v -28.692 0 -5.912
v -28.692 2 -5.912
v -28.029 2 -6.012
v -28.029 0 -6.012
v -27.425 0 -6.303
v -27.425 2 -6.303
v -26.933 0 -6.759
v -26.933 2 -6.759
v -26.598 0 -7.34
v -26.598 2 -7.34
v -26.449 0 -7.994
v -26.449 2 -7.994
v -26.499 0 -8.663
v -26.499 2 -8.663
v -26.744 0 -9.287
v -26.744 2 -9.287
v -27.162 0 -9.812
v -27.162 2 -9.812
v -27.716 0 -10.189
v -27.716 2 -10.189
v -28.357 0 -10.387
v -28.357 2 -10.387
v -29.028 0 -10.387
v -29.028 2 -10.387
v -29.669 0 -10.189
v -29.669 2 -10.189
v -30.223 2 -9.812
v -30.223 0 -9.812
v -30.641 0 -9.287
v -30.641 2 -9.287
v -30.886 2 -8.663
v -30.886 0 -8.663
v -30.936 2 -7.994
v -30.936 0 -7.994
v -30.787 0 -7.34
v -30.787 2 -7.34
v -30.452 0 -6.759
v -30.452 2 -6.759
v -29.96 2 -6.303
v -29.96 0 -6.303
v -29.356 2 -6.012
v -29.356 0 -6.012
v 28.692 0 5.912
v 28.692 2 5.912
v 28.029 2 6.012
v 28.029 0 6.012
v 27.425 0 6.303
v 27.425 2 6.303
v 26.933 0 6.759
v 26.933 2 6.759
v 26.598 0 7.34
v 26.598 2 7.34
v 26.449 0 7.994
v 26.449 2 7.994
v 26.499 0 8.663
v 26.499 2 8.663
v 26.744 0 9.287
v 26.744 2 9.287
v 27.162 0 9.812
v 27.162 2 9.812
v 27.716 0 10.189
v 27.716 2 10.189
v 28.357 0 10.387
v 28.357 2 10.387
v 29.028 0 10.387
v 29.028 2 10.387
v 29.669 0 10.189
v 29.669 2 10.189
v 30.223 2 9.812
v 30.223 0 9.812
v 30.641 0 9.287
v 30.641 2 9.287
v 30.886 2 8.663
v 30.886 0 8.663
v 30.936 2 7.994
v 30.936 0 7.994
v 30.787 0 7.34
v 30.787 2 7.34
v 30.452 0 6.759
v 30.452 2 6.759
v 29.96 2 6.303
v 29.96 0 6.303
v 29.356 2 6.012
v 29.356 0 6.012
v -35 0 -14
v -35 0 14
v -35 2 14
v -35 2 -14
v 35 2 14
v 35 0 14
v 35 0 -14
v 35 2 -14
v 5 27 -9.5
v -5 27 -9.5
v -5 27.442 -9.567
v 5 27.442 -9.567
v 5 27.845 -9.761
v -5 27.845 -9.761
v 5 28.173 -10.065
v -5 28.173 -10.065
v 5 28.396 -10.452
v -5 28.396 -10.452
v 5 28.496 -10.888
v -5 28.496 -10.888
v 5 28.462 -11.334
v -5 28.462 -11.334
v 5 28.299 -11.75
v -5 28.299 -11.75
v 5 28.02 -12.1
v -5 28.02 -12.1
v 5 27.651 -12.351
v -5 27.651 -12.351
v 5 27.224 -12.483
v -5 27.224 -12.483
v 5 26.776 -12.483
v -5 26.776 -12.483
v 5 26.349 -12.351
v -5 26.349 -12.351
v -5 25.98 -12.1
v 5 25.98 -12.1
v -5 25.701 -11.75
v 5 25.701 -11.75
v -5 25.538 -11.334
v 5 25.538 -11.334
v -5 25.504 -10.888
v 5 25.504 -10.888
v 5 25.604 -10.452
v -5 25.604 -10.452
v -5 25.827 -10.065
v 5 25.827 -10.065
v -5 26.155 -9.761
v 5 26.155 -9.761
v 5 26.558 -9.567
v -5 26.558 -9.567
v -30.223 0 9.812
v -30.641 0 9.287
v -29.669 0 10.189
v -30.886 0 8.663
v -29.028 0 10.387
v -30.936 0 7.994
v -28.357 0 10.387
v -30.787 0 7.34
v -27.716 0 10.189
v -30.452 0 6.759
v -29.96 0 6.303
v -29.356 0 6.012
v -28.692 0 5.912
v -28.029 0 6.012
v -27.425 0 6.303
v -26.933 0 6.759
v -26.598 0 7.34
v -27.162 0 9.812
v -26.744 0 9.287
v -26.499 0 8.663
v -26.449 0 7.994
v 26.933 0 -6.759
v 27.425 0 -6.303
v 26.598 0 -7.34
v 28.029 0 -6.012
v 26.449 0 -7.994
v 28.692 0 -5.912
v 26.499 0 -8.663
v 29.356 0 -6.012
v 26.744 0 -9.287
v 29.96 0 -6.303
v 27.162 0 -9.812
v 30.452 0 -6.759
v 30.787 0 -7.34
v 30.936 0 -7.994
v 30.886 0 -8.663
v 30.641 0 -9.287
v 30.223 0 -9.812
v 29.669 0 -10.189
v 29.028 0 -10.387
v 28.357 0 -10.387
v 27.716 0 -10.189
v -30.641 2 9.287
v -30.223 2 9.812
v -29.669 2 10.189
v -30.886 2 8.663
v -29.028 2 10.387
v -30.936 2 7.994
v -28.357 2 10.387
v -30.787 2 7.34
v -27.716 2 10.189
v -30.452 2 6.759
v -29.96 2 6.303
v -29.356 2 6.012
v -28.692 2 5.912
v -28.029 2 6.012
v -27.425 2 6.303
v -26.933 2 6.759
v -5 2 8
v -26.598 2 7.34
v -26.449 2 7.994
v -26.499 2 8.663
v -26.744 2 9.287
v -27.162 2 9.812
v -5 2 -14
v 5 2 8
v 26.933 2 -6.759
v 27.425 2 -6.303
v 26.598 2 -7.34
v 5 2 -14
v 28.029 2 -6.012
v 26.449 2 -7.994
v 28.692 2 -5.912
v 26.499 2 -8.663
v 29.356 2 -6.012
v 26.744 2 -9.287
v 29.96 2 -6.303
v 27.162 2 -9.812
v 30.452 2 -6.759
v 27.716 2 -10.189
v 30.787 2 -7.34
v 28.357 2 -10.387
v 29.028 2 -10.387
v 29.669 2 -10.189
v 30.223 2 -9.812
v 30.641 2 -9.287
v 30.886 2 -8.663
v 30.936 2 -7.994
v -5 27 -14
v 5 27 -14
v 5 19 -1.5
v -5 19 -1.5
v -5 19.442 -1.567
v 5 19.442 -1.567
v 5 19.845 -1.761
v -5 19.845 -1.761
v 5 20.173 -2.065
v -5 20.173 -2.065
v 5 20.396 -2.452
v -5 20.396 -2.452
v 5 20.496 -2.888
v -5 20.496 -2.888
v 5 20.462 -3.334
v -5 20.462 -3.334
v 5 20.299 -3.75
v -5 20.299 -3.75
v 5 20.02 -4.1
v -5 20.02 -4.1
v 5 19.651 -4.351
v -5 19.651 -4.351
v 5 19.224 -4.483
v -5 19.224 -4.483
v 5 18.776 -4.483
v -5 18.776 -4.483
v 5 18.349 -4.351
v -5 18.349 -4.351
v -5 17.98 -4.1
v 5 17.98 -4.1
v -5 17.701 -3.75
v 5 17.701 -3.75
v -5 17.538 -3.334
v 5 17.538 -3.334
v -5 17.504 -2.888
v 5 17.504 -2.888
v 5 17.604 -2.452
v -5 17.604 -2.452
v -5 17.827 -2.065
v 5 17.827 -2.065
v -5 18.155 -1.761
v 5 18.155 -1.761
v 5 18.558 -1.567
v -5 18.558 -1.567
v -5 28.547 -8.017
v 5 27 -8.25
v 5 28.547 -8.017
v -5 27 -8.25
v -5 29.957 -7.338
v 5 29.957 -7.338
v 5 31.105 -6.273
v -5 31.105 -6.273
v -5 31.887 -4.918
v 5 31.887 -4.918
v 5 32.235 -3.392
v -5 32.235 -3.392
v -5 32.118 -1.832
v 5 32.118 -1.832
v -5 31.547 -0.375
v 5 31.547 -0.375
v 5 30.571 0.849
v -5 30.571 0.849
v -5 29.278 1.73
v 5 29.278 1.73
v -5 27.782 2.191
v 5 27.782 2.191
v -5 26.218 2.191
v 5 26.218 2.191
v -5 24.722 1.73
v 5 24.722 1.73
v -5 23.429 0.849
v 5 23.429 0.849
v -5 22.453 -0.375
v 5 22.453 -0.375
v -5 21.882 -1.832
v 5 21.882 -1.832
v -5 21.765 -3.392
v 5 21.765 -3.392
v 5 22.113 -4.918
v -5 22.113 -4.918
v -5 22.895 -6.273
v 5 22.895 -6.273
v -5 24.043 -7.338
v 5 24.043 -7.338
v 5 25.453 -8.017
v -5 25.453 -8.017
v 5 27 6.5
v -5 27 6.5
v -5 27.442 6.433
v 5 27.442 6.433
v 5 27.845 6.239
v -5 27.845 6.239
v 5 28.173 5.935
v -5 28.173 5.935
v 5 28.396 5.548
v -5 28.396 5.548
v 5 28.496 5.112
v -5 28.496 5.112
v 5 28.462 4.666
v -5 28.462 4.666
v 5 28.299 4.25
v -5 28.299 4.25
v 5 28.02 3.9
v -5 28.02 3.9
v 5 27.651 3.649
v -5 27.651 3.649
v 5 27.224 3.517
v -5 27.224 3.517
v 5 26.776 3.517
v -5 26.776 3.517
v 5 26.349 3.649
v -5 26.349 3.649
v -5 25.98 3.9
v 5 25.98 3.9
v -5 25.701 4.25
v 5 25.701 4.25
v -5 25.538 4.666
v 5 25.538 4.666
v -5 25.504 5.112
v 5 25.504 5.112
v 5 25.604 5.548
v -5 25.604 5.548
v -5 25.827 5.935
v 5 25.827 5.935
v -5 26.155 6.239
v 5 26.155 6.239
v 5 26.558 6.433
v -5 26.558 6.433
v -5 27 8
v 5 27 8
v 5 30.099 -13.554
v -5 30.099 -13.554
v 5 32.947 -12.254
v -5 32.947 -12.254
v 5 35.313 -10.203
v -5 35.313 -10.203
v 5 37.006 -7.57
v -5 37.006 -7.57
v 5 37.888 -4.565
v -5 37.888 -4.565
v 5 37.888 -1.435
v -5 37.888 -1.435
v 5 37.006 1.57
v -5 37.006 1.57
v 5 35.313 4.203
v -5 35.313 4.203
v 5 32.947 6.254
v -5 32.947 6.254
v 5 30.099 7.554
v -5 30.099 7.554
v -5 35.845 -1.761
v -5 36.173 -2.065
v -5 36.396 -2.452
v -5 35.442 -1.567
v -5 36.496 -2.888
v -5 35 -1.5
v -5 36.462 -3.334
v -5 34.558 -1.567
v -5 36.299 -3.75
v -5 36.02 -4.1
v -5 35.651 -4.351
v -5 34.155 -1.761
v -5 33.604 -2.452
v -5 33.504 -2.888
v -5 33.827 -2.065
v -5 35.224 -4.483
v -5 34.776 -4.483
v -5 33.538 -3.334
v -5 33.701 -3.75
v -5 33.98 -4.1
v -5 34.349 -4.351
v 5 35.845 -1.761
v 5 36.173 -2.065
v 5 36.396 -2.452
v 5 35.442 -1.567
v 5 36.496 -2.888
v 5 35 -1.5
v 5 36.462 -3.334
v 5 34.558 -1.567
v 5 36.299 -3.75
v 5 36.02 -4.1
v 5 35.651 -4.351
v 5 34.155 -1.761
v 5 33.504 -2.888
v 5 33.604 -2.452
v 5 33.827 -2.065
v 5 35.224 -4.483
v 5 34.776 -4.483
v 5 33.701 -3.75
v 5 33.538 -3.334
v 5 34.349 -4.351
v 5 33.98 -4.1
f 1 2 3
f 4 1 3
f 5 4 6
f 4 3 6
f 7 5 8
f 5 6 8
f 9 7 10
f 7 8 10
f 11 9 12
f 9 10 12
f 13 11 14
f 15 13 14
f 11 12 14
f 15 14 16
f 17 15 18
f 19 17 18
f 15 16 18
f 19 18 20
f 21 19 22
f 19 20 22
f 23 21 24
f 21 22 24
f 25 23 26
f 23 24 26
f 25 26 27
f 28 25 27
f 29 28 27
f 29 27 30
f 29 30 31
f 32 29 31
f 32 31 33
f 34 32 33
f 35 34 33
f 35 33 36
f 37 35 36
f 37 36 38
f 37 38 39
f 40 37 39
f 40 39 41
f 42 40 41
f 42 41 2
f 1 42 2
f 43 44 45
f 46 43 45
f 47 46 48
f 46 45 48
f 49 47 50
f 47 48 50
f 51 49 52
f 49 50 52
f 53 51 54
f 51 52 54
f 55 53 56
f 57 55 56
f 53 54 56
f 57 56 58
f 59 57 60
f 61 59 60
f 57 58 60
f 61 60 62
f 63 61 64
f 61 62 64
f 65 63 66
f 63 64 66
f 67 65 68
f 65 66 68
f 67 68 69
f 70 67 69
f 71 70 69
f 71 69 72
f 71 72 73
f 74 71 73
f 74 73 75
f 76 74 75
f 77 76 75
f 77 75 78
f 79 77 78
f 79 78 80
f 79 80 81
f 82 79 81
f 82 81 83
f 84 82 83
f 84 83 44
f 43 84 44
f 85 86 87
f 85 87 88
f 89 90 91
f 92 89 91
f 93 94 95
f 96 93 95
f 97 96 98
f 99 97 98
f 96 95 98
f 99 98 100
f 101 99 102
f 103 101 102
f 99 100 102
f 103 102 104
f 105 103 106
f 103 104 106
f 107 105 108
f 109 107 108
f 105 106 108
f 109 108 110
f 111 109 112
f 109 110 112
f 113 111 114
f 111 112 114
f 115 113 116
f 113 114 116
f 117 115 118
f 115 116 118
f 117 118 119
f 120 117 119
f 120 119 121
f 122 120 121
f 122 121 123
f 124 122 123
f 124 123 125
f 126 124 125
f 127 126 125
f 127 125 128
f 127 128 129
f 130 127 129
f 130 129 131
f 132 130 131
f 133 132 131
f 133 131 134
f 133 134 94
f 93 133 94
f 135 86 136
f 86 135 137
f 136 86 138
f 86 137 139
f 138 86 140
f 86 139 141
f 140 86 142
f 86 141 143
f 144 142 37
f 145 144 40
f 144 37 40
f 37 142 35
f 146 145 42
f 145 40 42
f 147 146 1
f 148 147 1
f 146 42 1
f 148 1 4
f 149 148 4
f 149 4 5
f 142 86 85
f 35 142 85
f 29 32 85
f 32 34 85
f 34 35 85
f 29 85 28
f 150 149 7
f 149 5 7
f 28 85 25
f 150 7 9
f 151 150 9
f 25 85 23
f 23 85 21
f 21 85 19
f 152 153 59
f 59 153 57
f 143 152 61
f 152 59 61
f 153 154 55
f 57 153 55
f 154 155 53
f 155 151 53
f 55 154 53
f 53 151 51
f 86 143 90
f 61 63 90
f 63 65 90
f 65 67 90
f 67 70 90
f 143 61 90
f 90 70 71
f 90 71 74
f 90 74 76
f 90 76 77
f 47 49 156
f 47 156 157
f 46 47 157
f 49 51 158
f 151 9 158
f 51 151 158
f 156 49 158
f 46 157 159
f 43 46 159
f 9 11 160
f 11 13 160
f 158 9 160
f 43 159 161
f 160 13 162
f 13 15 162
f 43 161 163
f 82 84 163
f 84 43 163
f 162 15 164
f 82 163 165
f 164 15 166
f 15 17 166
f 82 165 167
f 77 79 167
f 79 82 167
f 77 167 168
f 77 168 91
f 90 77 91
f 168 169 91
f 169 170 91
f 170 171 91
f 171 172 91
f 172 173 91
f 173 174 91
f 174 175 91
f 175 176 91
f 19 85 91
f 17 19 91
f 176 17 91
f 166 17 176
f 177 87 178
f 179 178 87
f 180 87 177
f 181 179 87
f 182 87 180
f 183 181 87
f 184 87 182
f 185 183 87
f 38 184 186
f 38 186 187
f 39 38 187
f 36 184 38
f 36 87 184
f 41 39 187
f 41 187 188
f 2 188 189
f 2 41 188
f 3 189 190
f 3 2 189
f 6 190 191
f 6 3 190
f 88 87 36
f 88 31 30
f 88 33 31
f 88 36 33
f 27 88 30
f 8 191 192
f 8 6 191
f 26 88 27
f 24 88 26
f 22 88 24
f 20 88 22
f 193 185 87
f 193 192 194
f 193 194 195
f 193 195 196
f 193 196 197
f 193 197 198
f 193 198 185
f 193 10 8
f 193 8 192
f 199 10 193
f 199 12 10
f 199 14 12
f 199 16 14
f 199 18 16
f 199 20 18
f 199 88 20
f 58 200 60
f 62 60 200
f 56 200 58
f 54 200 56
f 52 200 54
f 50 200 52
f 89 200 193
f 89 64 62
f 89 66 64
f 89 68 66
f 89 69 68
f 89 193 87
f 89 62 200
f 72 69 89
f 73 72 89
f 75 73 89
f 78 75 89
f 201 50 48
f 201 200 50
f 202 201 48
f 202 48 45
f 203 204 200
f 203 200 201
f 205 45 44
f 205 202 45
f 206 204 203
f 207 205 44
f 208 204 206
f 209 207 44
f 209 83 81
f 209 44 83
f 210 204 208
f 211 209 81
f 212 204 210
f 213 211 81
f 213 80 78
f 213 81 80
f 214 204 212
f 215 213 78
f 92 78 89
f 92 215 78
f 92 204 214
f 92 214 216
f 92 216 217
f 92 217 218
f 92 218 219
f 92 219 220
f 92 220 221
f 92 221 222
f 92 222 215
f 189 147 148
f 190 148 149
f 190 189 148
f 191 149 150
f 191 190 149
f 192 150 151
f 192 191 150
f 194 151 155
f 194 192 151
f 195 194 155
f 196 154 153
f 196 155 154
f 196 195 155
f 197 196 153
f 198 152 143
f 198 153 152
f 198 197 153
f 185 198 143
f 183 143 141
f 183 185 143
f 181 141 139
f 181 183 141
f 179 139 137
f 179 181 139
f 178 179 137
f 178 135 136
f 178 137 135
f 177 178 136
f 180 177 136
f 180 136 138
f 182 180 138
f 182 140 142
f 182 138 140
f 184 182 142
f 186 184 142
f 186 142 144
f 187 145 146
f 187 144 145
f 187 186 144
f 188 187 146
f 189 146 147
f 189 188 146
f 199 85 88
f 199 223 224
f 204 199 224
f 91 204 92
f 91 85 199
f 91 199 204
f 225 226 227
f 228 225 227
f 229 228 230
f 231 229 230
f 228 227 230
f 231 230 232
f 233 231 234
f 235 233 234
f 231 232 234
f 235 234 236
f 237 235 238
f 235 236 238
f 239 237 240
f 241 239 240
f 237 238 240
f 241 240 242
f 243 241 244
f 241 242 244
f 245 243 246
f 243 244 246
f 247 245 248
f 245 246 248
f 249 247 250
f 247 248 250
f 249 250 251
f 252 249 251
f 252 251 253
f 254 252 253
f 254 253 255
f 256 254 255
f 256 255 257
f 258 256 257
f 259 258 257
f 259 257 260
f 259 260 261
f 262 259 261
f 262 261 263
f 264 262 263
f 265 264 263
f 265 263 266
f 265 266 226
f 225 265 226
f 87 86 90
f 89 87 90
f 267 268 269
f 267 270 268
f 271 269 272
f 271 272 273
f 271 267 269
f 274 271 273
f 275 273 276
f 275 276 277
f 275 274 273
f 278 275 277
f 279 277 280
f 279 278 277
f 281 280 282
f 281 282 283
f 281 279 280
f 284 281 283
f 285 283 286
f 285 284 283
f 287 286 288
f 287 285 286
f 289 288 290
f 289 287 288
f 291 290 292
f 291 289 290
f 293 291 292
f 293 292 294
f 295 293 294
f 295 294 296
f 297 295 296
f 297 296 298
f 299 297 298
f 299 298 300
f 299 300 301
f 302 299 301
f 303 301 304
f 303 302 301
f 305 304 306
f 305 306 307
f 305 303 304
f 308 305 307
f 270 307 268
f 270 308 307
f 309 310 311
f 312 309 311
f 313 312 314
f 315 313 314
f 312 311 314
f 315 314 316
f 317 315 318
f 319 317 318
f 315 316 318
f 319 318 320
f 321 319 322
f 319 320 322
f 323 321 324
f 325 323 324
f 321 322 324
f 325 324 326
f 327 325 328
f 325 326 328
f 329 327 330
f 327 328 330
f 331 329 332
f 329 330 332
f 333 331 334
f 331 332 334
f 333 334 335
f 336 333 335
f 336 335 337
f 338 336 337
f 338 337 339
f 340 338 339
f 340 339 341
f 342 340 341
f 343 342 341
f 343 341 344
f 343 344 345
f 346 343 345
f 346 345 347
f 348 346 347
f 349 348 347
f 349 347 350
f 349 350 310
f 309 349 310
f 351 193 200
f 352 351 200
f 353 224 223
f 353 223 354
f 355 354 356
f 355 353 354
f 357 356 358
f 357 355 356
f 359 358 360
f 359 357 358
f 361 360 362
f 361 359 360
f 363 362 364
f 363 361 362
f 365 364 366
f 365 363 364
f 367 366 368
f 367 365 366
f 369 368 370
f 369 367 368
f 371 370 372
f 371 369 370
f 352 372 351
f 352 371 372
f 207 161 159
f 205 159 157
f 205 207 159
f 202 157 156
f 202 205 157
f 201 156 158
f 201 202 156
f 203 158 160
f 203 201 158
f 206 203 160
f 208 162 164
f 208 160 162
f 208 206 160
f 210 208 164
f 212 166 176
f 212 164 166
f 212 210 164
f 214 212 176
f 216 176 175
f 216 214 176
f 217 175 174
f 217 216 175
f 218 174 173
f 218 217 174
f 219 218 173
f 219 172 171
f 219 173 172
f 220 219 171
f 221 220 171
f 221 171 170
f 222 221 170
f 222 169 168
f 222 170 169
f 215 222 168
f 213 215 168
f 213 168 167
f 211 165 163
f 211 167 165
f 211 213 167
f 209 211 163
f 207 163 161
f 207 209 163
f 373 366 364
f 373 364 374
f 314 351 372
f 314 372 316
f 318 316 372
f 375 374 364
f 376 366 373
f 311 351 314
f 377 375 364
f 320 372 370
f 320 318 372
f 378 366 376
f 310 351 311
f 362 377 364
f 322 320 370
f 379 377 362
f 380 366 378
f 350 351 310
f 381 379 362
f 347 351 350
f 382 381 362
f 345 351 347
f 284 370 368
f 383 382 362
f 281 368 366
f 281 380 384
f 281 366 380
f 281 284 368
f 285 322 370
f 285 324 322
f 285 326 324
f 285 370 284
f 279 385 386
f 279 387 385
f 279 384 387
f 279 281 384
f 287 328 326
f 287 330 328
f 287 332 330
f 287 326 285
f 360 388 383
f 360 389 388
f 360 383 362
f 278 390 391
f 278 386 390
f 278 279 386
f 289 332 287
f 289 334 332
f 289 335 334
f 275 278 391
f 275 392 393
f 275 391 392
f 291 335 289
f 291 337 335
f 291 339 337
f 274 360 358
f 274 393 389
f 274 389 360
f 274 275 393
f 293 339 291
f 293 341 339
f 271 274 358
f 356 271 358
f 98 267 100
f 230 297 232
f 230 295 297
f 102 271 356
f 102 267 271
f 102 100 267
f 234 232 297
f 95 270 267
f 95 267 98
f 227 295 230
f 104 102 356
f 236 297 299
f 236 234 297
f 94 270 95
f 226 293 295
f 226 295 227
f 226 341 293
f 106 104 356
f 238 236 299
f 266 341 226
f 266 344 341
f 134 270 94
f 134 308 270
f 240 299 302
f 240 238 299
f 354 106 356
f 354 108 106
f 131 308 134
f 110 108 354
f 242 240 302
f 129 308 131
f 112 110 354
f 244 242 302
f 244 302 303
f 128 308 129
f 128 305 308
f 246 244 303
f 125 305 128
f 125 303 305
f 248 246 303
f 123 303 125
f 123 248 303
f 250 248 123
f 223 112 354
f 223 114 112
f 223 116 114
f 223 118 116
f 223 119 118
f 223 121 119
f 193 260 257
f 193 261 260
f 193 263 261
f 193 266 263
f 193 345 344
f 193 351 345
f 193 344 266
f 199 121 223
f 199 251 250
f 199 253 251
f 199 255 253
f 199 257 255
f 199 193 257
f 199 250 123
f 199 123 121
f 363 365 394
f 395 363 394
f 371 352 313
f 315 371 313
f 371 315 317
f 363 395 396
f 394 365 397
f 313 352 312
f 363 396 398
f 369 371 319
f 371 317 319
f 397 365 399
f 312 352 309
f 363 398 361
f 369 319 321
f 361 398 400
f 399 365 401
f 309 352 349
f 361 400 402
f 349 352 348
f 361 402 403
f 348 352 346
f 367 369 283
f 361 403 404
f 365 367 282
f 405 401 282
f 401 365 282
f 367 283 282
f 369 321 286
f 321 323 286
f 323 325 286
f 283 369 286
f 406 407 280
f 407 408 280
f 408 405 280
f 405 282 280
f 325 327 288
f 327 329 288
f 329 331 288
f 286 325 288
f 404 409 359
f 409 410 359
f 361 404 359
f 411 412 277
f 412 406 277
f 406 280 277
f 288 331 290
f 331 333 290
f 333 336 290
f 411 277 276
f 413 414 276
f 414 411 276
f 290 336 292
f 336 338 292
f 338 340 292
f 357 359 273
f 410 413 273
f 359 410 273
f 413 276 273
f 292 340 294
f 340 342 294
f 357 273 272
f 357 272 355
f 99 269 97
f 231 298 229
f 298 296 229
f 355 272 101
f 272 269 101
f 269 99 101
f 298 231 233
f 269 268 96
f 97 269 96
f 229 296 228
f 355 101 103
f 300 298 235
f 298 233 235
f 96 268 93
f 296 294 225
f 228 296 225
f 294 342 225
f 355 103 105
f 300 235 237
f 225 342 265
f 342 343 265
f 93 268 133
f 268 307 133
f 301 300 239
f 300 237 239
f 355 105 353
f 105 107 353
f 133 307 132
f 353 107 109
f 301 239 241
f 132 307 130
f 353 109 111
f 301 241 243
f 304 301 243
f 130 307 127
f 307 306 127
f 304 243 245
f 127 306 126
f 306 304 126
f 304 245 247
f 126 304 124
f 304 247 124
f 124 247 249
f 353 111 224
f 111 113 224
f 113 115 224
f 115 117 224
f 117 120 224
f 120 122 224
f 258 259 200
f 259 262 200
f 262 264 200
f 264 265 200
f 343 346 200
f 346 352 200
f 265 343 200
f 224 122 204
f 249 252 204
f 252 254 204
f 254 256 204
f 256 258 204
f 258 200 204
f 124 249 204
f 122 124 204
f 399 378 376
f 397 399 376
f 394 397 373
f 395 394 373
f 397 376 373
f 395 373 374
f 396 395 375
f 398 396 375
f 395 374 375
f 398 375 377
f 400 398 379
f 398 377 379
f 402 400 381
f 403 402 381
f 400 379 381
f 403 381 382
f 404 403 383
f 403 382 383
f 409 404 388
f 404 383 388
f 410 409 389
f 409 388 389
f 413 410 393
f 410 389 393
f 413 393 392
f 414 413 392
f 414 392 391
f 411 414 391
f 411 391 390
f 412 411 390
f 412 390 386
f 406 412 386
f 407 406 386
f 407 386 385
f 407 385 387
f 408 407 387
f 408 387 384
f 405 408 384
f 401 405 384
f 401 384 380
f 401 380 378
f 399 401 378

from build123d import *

# Parameters (mm, degrees)
SKETCH1_W                = 70
SKETCH1_H                = 28
BOSS_EXTRUDE1_DEPTH      = 2
SKETCH2_R                = 11
SKETCH2_R_2              = 5.25
BOSS_EXTRUDE2_DEPTH      = 5
BOSS_EXTRUDE3_REACH      = 54.125
BOSS_EXTRUDE3_END_RADIUS = 11
SKETCH3_W                = 10
SKETCH3_H                = 22
SKETCH5_R                = 2.25
CUT_EXTRUDE1_DEPTH       = 53.12485012
MIRROR2_COPY_1_SKETCH_R  = 2.25
MIRROR2_COPY_1_DEPTH     = 53.12485012
SKETCH6_R                = 1.5
CUT_EXTRUDE2_DEPTH       = 57.920997883


with BuildPart() as part:
    # Sketch1 → Boss-Extrude1 (new body)
    with BuildSketch(Plane(origin=(0, 0, 0), x_dir=(1, 0, 0), z_dir=(0, 1, 0))):
        Rectangle(SKETCH1_W, SKETCH1_H)
    extrude(amount=BOSS_EXTRUDE1_DEPTH)



with BuildPart() as body_2:
    # Sketch2 → Boss-Extrude2 (new, symmetric)
    with BuildSketch(Plane(origin=(0, 0, 0), x_dir=(0, 0, -1), z_dir=(1, 0, 0))):
        with Locations((3, 27)):
            Circle(SKETCH2_R)
        with Locations((3, 27)):
            Circle(SKETCH2_R_2, mode=Mode.SUBTRACT)
    extrude(amount=BOSS_EXTRUDE2_DEPTH, both=True)


with BuildPart() as part_1:
    add(part.part)

    add(body_2.part)  # Boss-Extrude3 merges body 2
    # Boss-Extrude3: up to this cylinder (the profile starts outside it)
    boss_extrude3_end = Plane(origin=(0, 27, -3), z_dir=(-1, 0, 0)) * Cylinder(BOSS_EXTRUDE3_END_RADIUS, 131.25, mode=Mode.PRIVATE)
    # Sketch3 → Boss-Extrude3 (add, up to the surface)
    with BuildSketch(Plane(origin=(0, 2, 0), x_dir=(1, 0, 0), z_dir=(0, 1, 0)), mode=Mode.PRIVATE) as boss_extrude3_sk1:
        with Locations((0, 3)):
            Rectangle(SKETCH3_W, SKETCH3_H)
    boss_extrude3_tool1 = extrude(boss_extrude3_sk1.sketch, amount=BOSS_EXTRUDE3_REACH, mode=Mode.PRIVATE) - boss_extrude3_end
    add(boss_extrude3_tool1.solids().sort_by_distance((0, 2, -3))[0])

    # Sketch5 → Cut-Extrude1 (cut, through all)
    with BuildSketch(Plane(origin=(0, 2, 0), x_dir=(1, 0, 0), z_dir=(0, 1, 0))):
        with Locations(Location((-28.692400687, 8.162233715, 0), (0, 0, 270))):
            Circle(SKETCH5_R)
    cut_extrude1 = extrude(amount=-CUT_EXTRUDE1_DEPTH, mode=Mode.SUBTRACT)

    # Mirror1: Cut-Extrude1 across plane
    add(cut_extrude1.mirror(Plane(origin=(0, 0, 0), x_dir=(1, 0, 0), z_dir=(0, 0, -1))), mode=Mode.SUBTRACT)

    # Mirror2: Cut-Extrude1 across plane
    add(cut_extrude1.mirror(Plane.ZY), mode=Mode.SUBTRACT)

    # Mirror2 copy 1 sketch → Mirror2 copy 1 (cut, through all)
    with BuildSketch(Plane(origin=(0, 2, 0), x_dir=(-1, 0, 0), z_dir=(0, 1, 0))):
        with Locations(Location((-28.692400687, 8.162233715, 0), (0, 0, 270))):
            Circle(MIRROR2_COPY_1_SKETCH_R)
    extrude(amount=-MIRROR2_COPY_1_DEPTH, mode=Mode.SUBTRACT)

    # Sketch6 → Cut-Extrude2 (cut, through all)
    with BuildSketch(Plane.ZY.offset(5)):
        with Locations((-3, 35)):
            Circle(SKETCH6_R)
        with Locations((-11, 27)):
            Circle(SKETCH6_R)
        with Locations((5, 27)):
            Circle(SKETCH6_R)
        with Locations((-3, 19)):
            Circle(SKETCH6_R)
    extrude(amount=-CUT_EXTRUDE2_DEPTH, mode=Mode.SUBTRACT)


solid = part_1.part
